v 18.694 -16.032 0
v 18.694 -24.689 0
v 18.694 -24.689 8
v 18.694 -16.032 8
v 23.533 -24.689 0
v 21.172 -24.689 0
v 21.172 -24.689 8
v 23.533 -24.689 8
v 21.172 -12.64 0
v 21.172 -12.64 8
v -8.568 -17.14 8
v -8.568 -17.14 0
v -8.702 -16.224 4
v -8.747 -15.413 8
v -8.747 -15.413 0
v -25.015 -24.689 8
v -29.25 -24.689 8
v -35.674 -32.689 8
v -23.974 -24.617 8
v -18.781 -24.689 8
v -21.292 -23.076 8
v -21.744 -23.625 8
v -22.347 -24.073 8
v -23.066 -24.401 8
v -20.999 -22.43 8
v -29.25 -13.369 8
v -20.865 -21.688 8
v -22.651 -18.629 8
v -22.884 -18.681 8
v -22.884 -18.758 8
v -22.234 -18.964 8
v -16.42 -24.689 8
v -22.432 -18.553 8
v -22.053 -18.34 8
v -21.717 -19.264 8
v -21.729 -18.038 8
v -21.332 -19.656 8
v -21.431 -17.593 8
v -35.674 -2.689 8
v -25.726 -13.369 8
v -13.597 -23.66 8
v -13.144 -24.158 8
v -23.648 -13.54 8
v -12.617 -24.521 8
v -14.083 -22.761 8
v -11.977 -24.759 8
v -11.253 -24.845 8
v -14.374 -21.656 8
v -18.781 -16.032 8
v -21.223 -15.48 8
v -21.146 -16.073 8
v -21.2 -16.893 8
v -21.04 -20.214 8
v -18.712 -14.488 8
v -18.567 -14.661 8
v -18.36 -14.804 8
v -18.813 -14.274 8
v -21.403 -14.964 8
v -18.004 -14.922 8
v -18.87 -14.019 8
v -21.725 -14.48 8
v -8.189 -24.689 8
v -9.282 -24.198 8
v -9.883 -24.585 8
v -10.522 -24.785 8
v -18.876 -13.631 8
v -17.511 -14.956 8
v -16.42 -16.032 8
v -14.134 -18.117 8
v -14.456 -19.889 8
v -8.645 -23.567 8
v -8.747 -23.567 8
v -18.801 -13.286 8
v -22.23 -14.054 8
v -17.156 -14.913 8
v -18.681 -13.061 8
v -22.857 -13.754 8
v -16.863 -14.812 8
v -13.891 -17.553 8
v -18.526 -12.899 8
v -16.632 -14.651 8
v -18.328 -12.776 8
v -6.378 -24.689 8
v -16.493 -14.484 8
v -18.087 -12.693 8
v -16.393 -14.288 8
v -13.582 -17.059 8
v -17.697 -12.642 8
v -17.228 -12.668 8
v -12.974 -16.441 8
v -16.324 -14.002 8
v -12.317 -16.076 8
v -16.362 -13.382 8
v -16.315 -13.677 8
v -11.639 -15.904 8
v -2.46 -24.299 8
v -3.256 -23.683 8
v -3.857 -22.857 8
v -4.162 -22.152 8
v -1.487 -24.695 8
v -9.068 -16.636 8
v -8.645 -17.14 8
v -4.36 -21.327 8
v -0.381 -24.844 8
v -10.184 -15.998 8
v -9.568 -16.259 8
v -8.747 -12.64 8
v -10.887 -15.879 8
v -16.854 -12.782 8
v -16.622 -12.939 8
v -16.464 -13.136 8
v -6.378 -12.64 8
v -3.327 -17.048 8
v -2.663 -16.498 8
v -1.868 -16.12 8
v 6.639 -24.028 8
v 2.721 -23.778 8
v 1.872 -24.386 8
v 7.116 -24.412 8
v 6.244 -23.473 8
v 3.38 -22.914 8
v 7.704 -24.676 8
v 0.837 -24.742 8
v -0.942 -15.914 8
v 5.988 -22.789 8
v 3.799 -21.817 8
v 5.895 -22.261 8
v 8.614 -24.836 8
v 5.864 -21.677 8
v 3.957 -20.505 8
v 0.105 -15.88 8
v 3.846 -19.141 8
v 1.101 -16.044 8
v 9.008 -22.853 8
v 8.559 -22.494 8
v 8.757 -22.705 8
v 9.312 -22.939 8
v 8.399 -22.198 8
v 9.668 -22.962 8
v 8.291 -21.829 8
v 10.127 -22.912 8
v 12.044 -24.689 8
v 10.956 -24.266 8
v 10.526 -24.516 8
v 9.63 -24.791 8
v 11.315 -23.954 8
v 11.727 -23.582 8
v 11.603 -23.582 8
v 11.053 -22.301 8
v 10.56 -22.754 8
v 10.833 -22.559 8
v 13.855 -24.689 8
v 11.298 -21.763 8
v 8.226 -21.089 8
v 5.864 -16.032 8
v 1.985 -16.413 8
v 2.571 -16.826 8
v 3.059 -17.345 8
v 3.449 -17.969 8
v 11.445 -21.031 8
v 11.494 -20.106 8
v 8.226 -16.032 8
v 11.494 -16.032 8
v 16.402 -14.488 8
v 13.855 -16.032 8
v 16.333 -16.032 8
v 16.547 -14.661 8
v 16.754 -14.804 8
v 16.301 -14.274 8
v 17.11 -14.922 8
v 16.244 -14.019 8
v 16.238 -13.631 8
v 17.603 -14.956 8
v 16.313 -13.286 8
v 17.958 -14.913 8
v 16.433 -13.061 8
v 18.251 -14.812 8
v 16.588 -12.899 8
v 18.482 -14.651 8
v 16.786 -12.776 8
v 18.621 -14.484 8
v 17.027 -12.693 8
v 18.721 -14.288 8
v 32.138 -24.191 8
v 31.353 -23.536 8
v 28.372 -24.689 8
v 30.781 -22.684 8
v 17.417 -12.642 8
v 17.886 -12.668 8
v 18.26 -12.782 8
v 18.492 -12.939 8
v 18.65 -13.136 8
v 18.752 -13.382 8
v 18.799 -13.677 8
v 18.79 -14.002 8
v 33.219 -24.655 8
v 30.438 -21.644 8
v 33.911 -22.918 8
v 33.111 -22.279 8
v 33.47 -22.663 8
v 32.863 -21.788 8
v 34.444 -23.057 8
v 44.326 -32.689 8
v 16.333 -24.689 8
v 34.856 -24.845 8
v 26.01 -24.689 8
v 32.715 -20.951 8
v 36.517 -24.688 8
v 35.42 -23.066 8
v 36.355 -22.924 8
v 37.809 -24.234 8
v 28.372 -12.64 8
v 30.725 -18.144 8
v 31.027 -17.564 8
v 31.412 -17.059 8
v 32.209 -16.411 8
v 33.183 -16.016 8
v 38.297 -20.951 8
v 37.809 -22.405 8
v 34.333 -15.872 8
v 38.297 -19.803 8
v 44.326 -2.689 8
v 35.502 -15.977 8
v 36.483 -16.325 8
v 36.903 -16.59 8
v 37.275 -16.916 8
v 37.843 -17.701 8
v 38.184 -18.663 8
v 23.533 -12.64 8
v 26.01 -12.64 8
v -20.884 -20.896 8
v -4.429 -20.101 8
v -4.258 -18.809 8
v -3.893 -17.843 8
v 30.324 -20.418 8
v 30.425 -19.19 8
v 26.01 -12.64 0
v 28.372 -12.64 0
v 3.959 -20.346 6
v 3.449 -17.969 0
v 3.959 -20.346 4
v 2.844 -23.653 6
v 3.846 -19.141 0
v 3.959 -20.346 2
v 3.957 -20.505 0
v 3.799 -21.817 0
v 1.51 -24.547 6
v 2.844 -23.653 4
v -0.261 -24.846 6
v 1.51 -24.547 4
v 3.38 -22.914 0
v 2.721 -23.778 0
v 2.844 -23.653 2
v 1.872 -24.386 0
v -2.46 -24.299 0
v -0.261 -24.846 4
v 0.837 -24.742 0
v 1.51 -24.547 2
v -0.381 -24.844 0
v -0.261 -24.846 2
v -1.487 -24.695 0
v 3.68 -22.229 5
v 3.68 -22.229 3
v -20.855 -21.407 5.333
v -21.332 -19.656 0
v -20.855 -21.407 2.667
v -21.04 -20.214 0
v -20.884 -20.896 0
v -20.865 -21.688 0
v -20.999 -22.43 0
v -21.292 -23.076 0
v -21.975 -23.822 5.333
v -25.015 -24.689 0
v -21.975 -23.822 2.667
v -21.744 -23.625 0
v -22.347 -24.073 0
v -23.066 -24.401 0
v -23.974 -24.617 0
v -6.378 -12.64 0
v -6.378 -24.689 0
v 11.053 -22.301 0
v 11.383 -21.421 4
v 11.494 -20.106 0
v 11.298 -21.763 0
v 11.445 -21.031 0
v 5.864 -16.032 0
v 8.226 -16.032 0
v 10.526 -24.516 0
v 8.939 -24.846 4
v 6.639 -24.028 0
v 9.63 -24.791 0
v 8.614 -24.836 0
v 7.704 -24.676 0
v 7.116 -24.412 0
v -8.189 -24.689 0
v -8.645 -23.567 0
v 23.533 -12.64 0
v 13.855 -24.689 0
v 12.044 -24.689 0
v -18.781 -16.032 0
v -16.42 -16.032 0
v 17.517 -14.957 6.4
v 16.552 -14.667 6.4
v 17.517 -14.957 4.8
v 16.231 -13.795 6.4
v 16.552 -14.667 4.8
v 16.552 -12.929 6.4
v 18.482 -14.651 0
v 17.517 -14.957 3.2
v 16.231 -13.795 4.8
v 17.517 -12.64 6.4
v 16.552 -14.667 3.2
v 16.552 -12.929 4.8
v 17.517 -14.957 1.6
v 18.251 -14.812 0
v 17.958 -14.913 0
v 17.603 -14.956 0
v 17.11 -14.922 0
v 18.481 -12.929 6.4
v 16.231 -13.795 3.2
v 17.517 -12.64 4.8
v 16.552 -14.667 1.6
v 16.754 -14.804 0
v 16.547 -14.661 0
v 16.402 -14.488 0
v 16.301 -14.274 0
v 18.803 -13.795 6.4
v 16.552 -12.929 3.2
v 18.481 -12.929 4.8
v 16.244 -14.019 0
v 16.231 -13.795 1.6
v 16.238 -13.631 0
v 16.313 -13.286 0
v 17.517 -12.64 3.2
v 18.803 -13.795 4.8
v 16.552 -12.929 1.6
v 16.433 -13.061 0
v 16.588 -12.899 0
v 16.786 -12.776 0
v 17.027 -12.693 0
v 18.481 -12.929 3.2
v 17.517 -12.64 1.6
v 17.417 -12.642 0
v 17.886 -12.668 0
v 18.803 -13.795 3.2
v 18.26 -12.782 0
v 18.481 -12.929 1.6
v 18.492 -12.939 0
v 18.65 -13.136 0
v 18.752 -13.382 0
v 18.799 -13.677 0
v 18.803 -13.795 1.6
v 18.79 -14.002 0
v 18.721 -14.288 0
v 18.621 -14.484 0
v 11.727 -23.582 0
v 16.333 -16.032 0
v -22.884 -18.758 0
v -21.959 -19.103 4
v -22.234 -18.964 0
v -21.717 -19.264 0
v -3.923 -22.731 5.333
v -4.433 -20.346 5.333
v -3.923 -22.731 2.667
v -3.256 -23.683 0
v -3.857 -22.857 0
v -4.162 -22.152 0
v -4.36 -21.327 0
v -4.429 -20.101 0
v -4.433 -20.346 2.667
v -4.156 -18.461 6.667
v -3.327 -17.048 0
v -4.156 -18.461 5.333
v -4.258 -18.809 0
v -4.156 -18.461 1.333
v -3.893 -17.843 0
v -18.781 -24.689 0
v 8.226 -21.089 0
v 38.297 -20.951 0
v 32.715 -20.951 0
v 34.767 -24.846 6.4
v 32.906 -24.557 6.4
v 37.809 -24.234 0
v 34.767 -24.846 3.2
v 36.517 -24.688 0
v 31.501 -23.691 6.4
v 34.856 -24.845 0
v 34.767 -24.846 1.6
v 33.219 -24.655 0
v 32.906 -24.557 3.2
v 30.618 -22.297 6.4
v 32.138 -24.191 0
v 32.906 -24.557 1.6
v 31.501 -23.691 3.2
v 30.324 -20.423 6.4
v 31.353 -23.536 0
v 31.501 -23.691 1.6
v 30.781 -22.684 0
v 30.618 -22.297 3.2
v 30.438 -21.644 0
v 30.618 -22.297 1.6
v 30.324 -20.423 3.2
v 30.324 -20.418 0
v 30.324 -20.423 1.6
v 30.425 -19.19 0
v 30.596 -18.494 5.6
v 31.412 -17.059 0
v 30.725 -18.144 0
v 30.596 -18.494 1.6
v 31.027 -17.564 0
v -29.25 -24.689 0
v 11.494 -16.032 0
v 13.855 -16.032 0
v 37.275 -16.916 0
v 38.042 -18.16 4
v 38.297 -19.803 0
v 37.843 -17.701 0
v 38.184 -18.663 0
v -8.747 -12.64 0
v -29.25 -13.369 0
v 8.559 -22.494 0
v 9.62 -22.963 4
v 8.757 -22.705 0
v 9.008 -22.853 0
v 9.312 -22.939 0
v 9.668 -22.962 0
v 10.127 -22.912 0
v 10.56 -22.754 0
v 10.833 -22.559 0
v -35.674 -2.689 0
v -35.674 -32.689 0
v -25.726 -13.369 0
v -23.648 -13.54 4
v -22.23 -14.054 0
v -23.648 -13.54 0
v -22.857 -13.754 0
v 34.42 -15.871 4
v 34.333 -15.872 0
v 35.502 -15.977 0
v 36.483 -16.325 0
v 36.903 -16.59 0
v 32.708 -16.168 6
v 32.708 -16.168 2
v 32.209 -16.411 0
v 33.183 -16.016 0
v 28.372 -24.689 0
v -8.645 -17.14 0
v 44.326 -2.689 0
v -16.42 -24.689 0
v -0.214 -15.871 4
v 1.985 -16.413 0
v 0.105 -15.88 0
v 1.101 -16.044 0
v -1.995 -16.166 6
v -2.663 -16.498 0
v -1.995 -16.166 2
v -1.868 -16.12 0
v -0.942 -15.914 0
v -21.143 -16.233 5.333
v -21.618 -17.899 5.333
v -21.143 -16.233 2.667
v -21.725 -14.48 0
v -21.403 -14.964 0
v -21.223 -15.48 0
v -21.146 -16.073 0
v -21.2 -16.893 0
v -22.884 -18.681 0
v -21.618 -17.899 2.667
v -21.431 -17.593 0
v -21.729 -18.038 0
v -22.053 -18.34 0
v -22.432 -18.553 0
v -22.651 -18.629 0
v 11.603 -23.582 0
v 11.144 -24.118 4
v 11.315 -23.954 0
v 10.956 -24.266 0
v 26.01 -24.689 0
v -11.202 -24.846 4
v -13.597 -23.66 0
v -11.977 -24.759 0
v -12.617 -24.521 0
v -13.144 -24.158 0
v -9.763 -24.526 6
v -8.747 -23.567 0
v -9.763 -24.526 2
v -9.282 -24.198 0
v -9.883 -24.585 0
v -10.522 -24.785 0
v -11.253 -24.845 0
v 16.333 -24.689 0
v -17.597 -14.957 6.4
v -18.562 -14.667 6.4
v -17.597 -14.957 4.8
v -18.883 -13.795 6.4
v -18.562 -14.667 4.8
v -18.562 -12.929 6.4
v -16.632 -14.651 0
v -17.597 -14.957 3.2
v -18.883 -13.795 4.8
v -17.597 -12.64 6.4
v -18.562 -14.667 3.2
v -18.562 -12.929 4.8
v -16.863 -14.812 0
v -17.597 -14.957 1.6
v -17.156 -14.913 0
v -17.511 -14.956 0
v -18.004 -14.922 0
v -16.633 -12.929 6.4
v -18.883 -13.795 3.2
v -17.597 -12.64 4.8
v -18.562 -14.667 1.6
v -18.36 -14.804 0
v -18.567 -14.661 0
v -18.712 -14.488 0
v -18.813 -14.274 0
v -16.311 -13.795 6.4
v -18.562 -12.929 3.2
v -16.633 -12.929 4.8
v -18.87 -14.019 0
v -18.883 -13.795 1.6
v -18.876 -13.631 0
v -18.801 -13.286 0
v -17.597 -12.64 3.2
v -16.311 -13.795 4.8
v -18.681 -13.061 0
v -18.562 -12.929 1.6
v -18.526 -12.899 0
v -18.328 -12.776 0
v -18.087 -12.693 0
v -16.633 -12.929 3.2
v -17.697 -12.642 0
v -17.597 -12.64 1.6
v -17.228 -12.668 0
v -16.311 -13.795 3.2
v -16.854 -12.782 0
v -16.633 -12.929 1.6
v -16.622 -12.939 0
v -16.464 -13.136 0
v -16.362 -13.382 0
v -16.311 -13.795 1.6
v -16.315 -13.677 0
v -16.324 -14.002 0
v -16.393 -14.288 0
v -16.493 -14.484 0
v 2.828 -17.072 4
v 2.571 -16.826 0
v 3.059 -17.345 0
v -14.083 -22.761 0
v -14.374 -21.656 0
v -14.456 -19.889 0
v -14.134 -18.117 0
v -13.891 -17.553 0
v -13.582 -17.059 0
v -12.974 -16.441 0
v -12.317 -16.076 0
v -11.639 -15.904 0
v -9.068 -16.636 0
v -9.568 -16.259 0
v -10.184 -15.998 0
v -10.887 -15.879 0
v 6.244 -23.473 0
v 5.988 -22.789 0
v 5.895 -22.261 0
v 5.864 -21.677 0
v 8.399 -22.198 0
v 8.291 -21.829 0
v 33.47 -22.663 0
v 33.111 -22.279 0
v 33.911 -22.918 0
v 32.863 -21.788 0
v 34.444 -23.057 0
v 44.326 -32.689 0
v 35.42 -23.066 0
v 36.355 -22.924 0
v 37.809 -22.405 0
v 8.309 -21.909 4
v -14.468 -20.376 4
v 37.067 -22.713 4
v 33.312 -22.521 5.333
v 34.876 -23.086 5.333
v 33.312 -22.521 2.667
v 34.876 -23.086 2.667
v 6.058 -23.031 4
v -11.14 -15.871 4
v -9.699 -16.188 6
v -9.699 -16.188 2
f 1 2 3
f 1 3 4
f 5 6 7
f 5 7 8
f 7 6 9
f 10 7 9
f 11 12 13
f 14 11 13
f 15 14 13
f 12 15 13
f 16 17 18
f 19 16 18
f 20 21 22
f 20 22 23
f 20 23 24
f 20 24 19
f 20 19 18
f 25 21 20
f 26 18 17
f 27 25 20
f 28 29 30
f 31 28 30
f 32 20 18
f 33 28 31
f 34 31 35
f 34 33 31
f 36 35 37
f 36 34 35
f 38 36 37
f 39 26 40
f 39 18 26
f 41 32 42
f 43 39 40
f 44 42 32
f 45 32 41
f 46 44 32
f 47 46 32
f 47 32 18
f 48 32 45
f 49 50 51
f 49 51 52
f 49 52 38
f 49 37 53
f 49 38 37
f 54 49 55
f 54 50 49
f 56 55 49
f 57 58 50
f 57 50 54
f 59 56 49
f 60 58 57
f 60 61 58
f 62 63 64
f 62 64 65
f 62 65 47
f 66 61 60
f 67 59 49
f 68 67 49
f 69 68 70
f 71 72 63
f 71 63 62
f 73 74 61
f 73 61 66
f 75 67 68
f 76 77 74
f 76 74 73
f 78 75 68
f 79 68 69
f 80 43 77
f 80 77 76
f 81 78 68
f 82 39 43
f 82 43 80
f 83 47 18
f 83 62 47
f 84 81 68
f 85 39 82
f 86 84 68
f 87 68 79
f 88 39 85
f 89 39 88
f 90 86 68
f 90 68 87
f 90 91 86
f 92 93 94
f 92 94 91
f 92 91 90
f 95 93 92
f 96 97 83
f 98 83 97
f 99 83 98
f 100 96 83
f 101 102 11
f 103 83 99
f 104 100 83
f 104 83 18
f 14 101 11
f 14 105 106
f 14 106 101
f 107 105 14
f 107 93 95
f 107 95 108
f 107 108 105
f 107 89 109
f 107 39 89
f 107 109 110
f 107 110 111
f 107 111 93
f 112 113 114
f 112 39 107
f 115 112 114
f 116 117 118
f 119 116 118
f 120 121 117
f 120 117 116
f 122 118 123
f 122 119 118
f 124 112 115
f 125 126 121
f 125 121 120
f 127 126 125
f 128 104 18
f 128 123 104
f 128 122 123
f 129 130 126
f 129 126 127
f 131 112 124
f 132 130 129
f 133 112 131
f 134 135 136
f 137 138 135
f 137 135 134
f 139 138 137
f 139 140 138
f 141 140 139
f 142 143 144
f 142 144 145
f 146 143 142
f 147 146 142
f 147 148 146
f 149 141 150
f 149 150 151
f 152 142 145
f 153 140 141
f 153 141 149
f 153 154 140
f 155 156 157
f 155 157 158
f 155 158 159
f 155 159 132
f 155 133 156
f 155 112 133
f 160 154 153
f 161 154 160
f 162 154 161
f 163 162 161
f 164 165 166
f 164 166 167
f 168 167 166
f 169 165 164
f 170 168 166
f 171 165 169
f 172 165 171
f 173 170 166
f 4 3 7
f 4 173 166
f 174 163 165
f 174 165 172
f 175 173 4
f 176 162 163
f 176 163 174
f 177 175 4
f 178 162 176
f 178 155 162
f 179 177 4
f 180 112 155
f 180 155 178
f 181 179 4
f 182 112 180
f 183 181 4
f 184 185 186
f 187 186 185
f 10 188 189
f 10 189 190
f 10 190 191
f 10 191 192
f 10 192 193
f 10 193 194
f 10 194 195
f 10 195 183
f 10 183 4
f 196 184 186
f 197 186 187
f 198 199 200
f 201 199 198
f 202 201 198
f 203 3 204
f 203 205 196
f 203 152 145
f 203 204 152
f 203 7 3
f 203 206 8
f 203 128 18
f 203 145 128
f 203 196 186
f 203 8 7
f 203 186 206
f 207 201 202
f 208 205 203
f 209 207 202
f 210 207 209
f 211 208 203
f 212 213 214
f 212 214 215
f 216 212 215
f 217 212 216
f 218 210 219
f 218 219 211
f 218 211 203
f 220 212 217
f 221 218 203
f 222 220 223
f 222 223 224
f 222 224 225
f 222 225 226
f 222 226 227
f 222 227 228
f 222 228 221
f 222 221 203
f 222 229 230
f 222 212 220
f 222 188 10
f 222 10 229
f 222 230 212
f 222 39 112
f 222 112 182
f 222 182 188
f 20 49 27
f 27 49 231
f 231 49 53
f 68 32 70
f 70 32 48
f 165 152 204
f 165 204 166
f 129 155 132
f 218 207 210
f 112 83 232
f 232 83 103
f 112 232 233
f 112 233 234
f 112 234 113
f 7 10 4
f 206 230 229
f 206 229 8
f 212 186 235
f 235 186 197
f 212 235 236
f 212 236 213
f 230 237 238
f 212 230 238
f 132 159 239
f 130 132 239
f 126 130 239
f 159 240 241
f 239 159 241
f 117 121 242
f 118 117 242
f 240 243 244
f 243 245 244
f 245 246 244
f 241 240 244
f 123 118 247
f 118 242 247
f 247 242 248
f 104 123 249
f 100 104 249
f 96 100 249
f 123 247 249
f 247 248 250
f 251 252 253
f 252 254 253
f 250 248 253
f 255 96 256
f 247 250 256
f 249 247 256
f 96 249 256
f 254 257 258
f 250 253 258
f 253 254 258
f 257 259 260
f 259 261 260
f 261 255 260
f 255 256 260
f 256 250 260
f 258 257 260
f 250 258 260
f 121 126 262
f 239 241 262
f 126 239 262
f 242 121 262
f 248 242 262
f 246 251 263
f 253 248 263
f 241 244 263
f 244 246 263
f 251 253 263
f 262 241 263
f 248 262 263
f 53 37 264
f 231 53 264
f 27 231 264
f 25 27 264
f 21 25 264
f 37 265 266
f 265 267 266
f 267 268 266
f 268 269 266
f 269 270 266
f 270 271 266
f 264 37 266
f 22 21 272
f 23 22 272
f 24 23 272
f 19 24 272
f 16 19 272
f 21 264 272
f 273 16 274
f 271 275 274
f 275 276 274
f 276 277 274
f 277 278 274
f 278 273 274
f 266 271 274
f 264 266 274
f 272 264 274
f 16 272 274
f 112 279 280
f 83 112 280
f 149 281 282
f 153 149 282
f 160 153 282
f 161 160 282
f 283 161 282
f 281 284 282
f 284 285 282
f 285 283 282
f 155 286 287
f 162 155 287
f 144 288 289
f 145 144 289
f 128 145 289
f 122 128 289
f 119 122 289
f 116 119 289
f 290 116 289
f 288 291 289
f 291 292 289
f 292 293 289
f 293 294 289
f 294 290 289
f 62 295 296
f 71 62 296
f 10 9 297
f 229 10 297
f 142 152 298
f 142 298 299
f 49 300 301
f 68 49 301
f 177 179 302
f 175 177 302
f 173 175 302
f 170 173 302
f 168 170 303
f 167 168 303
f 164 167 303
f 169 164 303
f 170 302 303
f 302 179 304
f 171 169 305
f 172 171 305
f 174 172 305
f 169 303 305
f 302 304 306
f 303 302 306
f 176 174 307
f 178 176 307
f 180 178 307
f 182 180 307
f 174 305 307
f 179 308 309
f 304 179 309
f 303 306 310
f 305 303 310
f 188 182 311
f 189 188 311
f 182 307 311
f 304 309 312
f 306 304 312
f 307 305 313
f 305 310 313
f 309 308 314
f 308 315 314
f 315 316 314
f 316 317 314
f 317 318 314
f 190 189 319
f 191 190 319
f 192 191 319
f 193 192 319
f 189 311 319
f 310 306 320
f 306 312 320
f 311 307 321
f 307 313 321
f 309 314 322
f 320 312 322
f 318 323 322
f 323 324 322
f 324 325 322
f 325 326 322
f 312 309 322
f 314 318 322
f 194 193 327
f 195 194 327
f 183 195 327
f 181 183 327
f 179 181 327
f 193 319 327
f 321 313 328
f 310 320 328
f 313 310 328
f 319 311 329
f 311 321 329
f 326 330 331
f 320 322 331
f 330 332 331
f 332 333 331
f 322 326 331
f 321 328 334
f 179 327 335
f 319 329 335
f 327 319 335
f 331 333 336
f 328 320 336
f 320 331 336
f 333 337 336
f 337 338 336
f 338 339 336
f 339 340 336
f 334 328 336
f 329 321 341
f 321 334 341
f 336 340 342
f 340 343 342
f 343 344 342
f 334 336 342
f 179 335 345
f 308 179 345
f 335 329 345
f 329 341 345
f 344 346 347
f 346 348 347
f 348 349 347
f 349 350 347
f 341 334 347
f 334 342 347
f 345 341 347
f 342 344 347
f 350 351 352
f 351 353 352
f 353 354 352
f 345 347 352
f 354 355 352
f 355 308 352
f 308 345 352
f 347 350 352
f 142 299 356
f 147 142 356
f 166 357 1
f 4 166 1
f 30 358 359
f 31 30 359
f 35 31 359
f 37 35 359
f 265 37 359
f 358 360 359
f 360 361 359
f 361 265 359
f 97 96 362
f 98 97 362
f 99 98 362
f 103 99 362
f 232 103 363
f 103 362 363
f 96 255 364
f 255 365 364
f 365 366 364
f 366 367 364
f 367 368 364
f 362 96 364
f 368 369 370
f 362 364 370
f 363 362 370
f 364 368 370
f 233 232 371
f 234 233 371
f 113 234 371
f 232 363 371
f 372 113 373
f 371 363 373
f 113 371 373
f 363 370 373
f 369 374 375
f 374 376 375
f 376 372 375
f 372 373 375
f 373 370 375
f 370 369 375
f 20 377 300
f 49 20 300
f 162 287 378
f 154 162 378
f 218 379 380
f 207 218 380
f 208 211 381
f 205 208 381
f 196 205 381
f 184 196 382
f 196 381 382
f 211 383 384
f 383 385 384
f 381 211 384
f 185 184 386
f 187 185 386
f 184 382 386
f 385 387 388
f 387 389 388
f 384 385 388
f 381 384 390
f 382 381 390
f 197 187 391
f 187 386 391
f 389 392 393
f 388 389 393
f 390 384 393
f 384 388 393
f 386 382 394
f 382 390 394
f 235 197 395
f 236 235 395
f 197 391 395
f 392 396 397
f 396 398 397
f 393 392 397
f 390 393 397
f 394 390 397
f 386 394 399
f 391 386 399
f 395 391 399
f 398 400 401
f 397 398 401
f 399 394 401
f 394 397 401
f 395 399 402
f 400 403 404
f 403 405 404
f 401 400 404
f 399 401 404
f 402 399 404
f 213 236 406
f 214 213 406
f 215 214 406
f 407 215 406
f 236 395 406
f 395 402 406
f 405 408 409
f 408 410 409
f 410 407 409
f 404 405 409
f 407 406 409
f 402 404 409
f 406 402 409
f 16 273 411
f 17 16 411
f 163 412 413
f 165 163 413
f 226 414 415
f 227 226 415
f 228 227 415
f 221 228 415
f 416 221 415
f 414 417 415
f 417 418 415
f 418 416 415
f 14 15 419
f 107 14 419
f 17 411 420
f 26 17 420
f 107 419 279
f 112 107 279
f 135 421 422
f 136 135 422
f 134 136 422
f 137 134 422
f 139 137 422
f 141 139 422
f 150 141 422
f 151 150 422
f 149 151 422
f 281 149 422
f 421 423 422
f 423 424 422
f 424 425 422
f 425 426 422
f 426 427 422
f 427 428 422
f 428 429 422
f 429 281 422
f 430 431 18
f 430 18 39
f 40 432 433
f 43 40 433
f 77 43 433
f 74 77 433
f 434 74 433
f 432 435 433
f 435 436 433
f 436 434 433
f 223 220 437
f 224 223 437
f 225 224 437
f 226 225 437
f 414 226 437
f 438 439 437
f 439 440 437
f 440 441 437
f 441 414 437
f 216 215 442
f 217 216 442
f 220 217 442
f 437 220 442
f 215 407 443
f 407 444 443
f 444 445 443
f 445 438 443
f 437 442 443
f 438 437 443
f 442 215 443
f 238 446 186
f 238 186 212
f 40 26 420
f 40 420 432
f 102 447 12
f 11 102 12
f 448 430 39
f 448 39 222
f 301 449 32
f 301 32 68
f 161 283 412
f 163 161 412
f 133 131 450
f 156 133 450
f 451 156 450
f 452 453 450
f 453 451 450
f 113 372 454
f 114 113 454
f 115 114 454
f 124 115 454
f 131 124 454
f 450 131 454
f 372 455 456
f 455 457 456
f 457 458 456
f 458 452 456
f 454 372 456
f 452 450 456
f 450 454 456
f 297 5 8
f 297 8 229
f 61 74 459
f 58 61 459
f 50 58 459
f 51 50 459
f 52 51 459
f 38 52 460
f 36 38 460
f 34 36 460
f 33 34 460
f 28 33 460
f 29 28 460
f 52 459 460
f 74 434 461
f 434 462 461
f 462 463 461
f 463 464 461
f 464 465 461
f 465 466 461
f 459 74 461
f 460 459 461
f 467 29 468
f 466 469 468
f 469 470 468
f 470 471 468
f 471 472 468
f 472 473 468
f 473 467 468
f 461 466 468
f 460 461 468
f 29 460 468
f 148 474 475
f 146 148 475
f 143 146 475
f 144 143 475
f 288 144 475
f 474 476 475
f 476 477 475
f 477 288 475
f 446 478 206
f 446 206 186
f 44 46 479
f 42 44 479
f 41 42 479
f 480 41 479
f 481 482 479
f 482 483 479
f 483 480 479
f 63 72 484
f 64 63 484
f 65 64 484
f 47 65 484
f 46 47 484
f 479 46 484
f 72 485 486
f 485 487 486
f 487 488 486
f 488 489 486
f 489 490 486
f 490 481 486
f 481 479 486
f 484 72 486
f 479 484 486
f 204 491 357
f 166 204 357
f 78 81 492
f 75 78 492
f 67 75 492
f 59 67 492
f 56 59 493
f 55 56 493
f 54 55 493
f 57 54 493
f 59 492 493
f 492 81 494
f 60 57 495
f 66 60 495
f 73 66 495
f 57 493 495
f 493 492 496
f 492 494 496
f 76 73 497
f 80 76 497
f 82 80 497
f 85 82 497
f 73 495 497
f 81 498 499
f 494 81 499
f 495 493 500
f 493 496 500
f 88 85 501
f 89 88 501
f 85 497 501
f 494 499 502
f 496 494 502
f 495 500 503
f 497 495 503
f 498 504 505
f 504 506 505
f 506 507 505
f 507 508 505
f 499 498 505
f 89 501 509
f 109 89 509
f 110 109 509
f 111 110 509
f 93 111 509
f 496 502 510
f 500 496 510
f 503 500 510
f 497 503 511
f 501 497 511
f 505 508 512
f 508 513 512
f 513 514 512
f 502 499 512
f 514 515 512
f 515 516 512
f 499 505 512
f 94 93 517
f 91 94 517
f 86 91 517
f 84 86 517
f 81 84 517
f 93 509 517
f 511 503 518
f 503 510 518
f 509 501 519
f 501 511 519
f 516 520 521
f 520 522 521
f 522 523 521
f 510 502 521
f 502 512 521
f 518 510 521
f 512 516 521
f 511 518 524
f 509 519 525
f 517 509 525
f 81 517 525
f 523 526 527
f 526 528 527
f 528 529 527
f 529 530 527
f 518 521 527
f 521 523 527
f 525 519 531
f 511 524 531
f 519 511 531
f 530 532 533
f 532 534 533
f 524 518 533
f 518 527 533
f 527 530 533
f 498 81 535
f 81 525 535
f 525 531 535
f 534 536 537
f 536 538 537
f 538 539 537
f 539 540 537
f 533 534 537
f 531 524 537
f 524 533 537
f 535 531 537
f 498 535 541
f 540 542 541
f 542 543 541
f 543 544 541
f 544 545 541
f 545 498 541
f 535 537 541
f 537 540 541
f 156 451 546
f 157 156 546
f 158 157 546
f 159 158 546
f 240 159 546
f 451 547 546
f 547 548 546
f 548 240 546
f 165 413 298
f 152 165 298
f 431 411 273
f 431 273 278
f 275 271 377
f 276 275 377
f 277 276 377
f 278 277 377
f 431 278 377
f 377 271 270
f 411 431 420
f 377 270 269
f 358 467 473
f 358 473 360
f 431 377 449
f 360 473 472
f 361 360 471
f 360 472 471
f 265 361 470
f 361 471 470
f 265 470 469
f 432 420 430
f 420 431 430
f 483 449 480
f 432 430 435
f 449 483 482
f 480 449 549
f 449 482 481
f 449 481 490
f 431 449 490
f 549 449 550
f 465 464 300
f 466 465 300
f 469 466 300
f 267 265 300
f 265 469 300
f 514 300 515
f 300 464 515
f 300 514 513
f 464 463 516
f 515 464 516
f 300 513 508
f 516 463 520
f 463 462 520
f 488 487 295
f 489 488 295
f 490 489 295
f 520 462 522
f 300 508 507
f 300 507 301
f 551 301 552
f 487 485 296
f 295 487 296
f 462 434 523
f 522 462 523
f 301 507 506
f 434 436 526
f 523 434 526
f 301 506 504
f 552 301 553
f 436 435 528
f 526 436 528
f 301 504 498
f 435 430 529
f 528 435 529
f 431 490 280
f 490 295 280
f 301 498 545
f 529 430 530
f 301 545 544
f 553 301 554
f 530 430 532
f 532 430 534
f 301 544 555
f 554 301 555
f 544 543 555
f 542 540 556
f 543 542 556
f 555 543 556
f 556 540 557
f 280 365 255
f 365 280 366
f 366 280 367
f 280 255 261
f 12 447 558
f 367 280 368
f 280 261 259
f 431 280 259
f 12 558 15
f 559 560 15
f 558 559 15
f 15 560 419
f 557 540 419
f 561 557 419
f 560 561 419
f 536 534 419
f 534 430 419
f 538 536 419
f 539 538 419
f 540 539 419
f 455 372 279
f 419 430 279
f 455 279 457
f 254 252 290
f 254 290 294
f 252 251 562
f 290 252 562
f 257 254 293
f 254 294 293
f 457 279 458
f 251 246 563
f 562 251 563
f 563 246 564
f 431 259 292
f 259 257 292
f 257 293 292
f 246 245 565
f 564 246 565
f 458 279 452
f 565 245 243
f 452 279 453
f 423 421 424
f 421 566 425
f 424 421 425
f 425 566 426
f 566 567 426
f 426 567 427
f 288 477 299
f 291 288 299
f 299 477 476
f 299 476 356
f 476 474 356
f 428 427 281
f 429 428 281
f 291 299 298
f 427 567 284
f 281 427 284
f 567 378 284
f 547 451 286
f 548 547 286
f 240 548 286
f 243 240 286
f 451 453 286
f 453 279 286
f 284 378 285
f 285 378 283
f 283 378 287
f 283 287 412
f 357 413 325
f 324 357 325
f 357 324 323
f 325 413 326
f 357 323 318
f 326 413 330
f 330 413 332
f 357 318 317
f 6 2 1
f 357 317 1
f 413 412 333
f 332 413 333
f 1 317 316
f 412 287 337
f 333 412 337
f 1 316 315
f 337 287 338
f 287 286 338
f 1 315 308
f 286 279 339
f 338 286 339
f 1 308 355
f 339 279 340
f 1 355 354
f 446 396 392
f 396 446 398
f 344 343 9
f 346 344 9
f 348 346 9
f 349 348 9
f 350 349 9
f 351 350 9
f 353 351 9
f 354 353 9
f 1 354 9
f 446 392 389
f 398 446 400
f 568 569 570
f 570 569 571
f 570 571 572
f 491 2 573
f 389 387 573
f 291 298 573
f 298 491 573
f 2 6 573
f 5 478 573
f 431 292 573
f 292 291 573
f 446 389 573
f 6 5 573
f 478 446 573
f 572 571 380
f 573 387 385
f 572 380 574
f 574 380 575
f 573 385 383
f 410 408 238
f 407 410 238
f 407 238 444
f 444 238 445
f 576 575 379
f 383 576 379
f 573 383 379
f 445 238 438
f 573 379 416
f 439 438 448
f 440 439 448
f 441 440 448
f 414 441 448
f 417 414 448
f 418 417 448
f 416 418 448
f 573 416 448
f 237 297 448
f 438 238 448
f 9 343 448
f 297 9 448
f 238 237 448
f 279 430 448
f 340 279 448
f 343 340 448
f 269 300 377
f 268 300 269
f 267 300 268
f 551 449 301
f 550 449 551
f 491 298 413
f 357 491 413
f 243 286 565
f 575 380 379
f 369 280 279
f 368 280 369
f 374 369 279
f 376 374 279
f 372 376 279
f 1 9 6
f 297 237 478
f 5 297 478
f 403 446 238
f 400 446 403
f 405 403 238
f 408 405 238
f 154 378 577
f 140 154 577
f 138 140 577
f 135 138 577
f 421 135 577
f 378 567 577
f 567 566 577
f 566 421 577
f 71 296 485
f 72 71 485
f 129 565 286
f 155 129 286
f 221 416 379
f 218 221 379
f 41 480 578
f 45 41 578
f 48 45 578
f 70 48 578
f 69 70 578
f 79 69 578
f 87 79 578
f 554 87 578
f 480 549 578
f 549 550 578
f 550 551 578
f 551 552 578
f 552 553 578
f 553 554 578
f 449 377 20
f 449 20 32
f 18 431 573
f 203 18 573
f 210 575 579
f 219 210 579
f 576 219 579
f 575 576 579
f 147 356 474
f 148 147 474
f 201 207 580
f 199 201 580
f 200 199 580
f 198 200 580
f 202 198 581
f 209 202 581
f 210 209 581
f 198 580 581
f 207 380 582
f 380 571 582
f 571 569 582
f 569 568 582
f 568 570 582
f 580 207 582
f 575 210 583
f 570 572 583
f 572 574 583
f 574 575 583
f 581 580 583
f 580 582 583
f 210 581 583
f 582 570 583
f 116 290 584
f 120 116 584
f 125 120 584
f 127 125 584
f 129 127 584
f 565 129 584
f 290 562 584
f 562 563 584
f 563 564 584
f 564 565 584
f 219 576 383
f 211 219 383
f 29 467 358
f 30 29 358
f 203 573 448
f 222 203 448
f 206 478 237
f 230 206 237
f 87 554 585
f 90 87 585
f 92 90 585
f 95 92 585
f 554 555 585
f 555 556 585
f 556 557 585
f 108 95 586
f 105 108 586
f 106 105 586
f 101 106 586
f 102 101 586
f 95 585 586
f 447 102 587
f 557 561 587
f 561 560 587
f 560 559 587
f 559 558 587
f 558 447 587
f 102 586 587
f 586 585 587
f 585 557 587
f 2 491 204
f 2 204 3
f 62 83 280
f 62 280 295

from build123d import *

# Parameters (mm, degrees)
F0_W     = 80
F0_H     = 30
F0_W_2   = 2.3612487611
F0_H_2   = 8.657086224
F0_H_3   = 12.0490584737
F1_DEPTH = 8


with BuildPart() as f1:
    # F0 (on Top) → F1 (new body)
    with BuildSketch(Plane.XY):
        with Locations((4.3256281316, -17.6894681206)):
            Rectangle(F0_W, F0_H)
        with Locations((-17.6007841578, -20.3609250086)):
            Rectangle(F0_W_2, F0_H_2, mode=Mode.SUBTRACT)
        with BuildLine():
            Line((-29.2496939695, -24.6894681206), (-29.2496939695, -13.3688536509))
            Line((-29.2496939695, -13.3688536509), (-25.7264035829, -13.3688536509))
            add(Edge.make_bspline(
                [(-25.7264035829, -13.3688536509), (-23.3180785086, -13.3688536509), (-22.2303679041, -14.0539378927)],
                knots=[0, 0, 0, 1, 1, 1], degree=2))
            add(Edge.make_bspline(
                [(-22.2303679041, -14.0539378927), (-21.1426572995, -14.7390221345), (-21.1426572995, -16.2330756528)],
                knots=[0, 0, 0, 1, 1, 1], degree=2))
            add(Edge.make_bspline(
                [(-21.1426572995, -16.2330756528), (-21.1426572995, -17.2489329373), (-21.6183758327, -17.8993293694)],
                knots=[0, 0, 0, 1, 1, 1], degree=2))
            add(Edge.make_bspline(
                [(-21.6183758327, -17.8993293694), (-22.0940943659, -18.5497258015), (-22.8844808872, -18.6810439383)],
                knots=[0, 0, 0, 1, 1, 1], degree=2))
            Line((-22.8844808872, -18.6810439383), (-22.8844808872, -18.7578526598))
            add(Edge.make_bspline(
                [(-22.8844808872, -18.7578526598), (-21.8091587861, -18.9981896271), (-21.3322014026, -19.6560191613)],
                knots=[0, 0, 0, 1, 1, 1], degree=2))
            add(Edge.make_bspline(
                [(-21.3322014026, -19.6560191613), (-20.855244019, -20.3138486955), (-20.855244019, -21.4065147014)],
                knots=[0, 0, 0, 1, 1, 1], degree=2))
            add(Edge.make_bspline(
                [(-20.855244019, -21.4065147014), (-20.855244019, -22.955077635), (-21.9751647326, -23.8222728778)],
                knots=[0, 0, 0, 1, 1, 1], degree=2))
            add(Edge.make_bspline(
                [(-21.9751647326, -23.8222728778), (-23.0950854462, -24.6894681206), (-25.0153034838, -24.6894681206)],
                knots=[0, 0, 0, 1, 1, 1], degree=2))
            Line((-25.0153034838, -24.6894681206), (-29.2496939695, -24.6894681206))
        make_face(mode=Mode.SUBTRACT)
        with BuildLine():
            add(Edge.make_bspline(
                [(-8.7467207286, -23.5670697064), (-9.5519734541, -24.8455632643), (-11.2021221161, -24.8455632643)],
                knots=[0, 0, 0, 1, 1, 1], degree=2))
            add(Edge.make_bspline(
                [(-11.2021221161, -24.8455632643), (-12.7259080428, -24.8455632643), (-13.5968198367, -23.6599834824)],
                knots=[0, 0, 0, 1, 1, 1], degree=2))
            add(Edge.make_bspline(
                [(-13.5968198367, -23.6599834824), (-14.4677316305, -22.4744037004), (-14.4677316305, -20.3757912128)],
                knots=[0, 0, 0, 1, 1, 1], degree=2))
            add(Edge.make_bspline(
                [(-14.4677316305, -20.3757912128), (-14.4677316305, -18.2474463169), (-13.5819536325, -17.0593888342)],
                knots=[0, 0, 0, 1, 1, 1], degree=2))
            add(Edge.make_bspline(
                [(-13.5819536325, -17.0593888342), (-12.6961756345, -15.8713313516), (-11.1401795988, -15.8713313516)],
                knots=[0, 0, 0, 1, 1, 1], degree=2))
            add(Edge.make_bspline(
                [(-11.1401795988, -15.8713313516), (-9.5048971409, -15.8713313516), (-8.6451350002, -17.1399141068)],
                knots=[0, 0, 0, 1, 1, 1], degree=2))
            Line((-8.6451350002, -17.1399141068), (-8.5683262787, -17.1399141068))
            add(Edge.make_bspline(
                [(-8.5683262787, -17.1399141068), (-8.7467207286, -16.1711331355), (-8.7467207286, -15.4129567232)],
                knots=[0, 0, 0, 1, 1, 1], degree=2))
            Line((-8.7467207286, -15.4129567232), (-8.7467207286, -12.6404096469))
            Line((-8.7467207286, -12.6404096469), (-6.3780388654, -12.6404096469))
            Line((-6.3780388654, -12.6404096469), (-6.3780388654, -24.6894681206))
            Line((-6.3780388654, -24.6894681206), (-8.1892380725, -24.6894681206))
            Line((-8.1892380725, -24.6894681206), (-8.6451350002, -23.5670697064))
            Line((-8.6451350002, -23.5670697064), (-8.7467207286, -23.5670697064))
        make_face(mode=Mode.SUBTRACT)
        with BuildLine():
            add(Edge.make_bspline(
                [(3.448522086, -17.9687049888), (3.958928429, -18.9833234229), (3.958928429, -20.3460588045)],
                knots=[0, 0, 0, 1, 1, 1], degree=2))
            add(Edge.make_bspline(
                [(3.958928429, -20.3460588045), (3.958928429, -22.4595374963), (2.8439631168, -23.6525503803)],
                knots=[0, 0, 0, 1, 1, 1], degree=2))
            add(Edge.make_bspline(
                [(2.8439631168, -23.6525503803), (1.7289978046, -24.8455632643), (-0.2605958525, -24.8455632643)],
                knots=[0, 0, 0, 1, 1, 1], degree=2))
            add(Edge.make_bspline(
                [(-0.2605958525, -24.8455632643), (-1.5068793015, -24.8455632643), (-2.4595552182, -24.2992302614)],
                knots=[0, 0, 0, 1, 1, 1], degree=2))
            add(Edge.make_bspline(
                [(-2.4595552182, -24.2992302614), (-3.412231135, -23.7528972584), (-3.9226374779, -22.7308457222)],
                knots=[0, 0, 0, 1, 1, 1], degree=2))
            add(Edge.make_bspline(
                [(-3.9226374779, -22.7308457222), (-4.4330438208, -21.708794186), (-4.4330438208, -20.3460588045)],
                knots=[0, 0, 0, 1, 1, 1], degree=2))
            add(Edge.make_bspline(
                [(-4.4330438208, -20.3460588045), (-4.4330438208, -18.2251470106), (-3.326750461, -17.0482391811)],
                knots=[0, 0, 0, 1, 1, 1], degree=2))
            add(Edge.make_bspline(
                [(-3.326750461, -17.0482391811), (-2.2204571013, -15.8713313516), (-0.2135195393, -15.8713313516)],
                knots=[0, 0, 0, 1, 1, 1], degree=2))
            add(Edge.make_bspline(
                [(-0.2135195393, -15.8713313516), (1.0327639096, -15.8713313516), (1.9854398264, -16.4127089531)],
                knots=[0, 0, 0, 1, 1, 1], degree=2))
            add(Edge.make_bspline(
                [(1.9854398264, -16.4127089531), (2.9381157431, -16.9540865547), (3.448522086, -17.9687049888)],
                knots=[0, 0, 0, 1, 1, 1], degree=2))
        make_face(mode=Mode.SUBTRACT)
        with BuildLine():
            Line((13.8548649998, -24.6894681206), (12.0436657927, -24.6894681206))
            Line((12.0436657927, -24.6894681206), (11.7265201039, -23.5819359105))
            Line((11.7265201039, -23.5819359105), (11.6026350692, -23.5819359105))
            add(Edge.make_bspline(
                [(11.6026350692, -23.5819359105), (11.223546863, -24.1864948798), (10.5260741178, -24.5160290721)],
                knots=[0, 0, 0, 1, 1, 1], degree=2))
            add(Edge.make_bspline(
                [(10.5260741178, -24.5160290721), (9.8286013725, -24.8455632643), (8.9391068234, -24.8455632643)],
                knots=[0, 0, 0, 1, 1, 1], degree=2))
            add(Edge.make_bspline(
                [(8.9391068234, -24.8455632643), (7.412843196, -24.8455632643), (6.6385617292, -24.0279220354)],
                knots=[0, 0, 0, 1, 1, 1], degree=2))
            add(Edge.make_bspline(
                [(6.6385617292, -24.0279220354), (5.8642802625, -23.2102808065), (5.8642802625, -21.676584077)],
                knots=[0, 0, 0, 1, 1, 1], degree=2))
            Line((5.8642802625, -21.676584077), (5.8642802625, -16.0323818966))
            Line((5.8642802625, -16.0323818966), (8.2255290236, -16.0323818966))
            Line((8.2255290236, -16.0323818966), (8.2255290236, -21.0893690126))
            add(Edge.make_bspline(
                [(8.2255290236, -21.0893690126), (8.2255290236, -22.0259398748), (8.5587797669, -22.494225306)],
                knots=[0, 0, 0, 1, 1, 1], degree=2))
            add(Edge.make_bspline(
                [(8.5587797669, -22.494225306), (8.8920305102, -22.9625107371), (9.6204745142, -22.9625107371)],
                knots=[0, 0, 0, 1, 1, 1], degree=2))
            add(Edge.make_bspline(
                [(9.6204745142, -22.9625107371), (10.6115547917, -22.9625107371), (11.0525855152, -22.3009646519)],
                knots=[0, 0, 0, 1, 1, 1], degree=2))
            add(Edge.make_bspline(
                [(11.0525855152, -22.3009646519), (11.4936162387, -21.6394185666), (11.4936162387, -20.1057218372)],
                knots=[0, 0, 0, 1, 1, 1], degree=2))
            Line((11.4936162387, -20.1057218372), (11.4936162387, -16.0323818966))
            Line((11.4936162387, -16.0323818966), (13.8548649998, -16.0323818966))
            Line((13.8548649998, -16.0323818966), (13.8548649998, -24.6894681206))
        make_face(mode=Mode.SUBTRACT)
        with Locations((17.5131900741, -20.3609250086)):
            Rectangle(F0_W_2, F0_H_2, mode=Mode.SUBTRACT)
        with Locations((22.3521395291, -18.6649388838)):
            Rectangle(F0_W_2, F0_H_3, mode=Mode.SUBTRACT)
        with BuildLine():
            add(Edge.make_bspline(
                [(36.4861831366, -24.694423522), (35.7825161396, -24.8455632643), (34.7666588551, -24.8455632643)],
                knots=[0, 0, 0, 1, 1, 1], degree=2))
            add(Edge.make_bspline(
                [(34.7666588551, -24.8455632643), (32.6779571703, -24.8455632643), (31.5010493407, -23.690954741)],
                knots=[0, 0, 0, 1, 1, 1], degree=2))
            add(Edge.make_bspline(
                [(31.5010493407, -23.690954741), (30.3241415112, -22.5363462178), (30.3241415112, -20.422867526)],
                knots=[0, 0, 0, 1, 1, 1], degree=2))
            add(Edge.make_bspline(
                [(30.3241415112, -20.422867526), (30.3241415112, -18.2474463169), (31.4118521158, -17.0593888342)],
                knots=[0, 0, 0, 1, 1, 1], degree=2))
            add(Edge.make_bspline(
                [(31.4118521158, -17.0593888342), (32.4995627203, -15.8713313516), (34.419780758, -15.8713313516)],
                knots=[0, 0, 0, 1, 1, 1], degree=2))
            add(Edge.make_bspline(
                [(34.419780758, -15.8713313516), (36.2532792714, -15.8713313516), (37.2753308075, -16.915682194)],
                knots=[0, 0, 0, 1, 1, 1], degree=2))
            add(Edge.make_bspline(
                [(37.2753308075, -16.915682194), (38.2973823437, -17.9600330364), (38.2973823437, -19.8034423525)],
                knots=[0, 0, 0, 1, 1, 1], degree=2))
            Line((38.2973823437, -19.8034423525), (38.2973823437, -20.9506177738))
            Line((38.2973823437, -20.9506177738), (32.7151226807, -20.9506177738))
            add(Edge.make_bspline(
                [(32.7151226807, -20.9506177738), (32.7547658918, -21.9565642554), (33.3122485479, -22.5214800136)],
                knots=[0, 0, 0, 1, 1, 1], degree=2))
            add(Edge.make_bspline(
                [(33.3122485479, -22.5214800136), (33.869731204, -23.0863957718), (34.8756776856, -23.0863957718)],
                knots=[0, 0, 0, 1, 1, 1], degree=2))
            add(Edge.make_bspline(
                [(34.8756776856, -23.0863957718), (35.6586311049, -23.0863957718), (36.3548649998, -22.9241063763)],
                knots=[0, 0, 0, 1, 1, 1], degree=2))
            add(Edge.make_bspline(
                [(36.3548649998, -22.9241063763), (37.0510988948, -22.7618169809), (37.809275307, -22.405028081)],
                knots=[0, 0, 0, 1, 1, 1], degree=2))
            Line((37.809275307, -22.405028081), (37.809275307, -24.233571193))
            add(Edge.make_bspline(
                [(37.809275307, -24.233571193), (37.1898501336, -24.5432837797), (36.4861831366, -24.694423522)],
                knots=[0, 0, 0, 1, 1, 1], degree=2))
        make_face(mode=Mode.SUBTRACT)
        with Locations((27.191088984, -18.6649388838)):
            Rectangle(F0_W_2, F0_H_3, mode=Mode.SUBTRACT)
        with BuildLine():
            add(Edge.make_bspline(
                [(-17.5970676067, -14.9570597956), (-18.8829942668, -14.9570597956), (-18.8829942668, -13.7950181702)],
                knots=[0, 0, 0, 1, 1, 1], degree=2))
            add(Edge.make_bspline(
                [(-18.8829942668, -13.7950181702), (-18.8829942668, -12.6404096469), (-17.5970676067, -12.6404096469)],
                knots=[0, 0, 0, 1, 1, 1], degree=2))
            add(Edge.make_bspline(
                [(-17.5970676067, -12.6404096469), (-16.3111409467, -12.6404096469), (-16.3111409467, -13.7950181702)],
                knots=[0, 0, 0, 1, 1, 1], degree=2))
            add(Edge.make_bspline(
                [(-16.3111409467, -13.7950181702), (-16.3111409467, -14.3450677242), (-16.6320031865, -14.6510637599)],
                knots=[0, 0, 0, 1, 1, 1], degree=2))
            add(Edge.make_bspline(
                [(-16.6320031865, -14.6510637599), (-16.9528654264, -14.9570597956), (-17.5970676067, -14.9570597956)],
                knots=[0, 0, 0, 1, 1, 1], degree=2))
        make_face(mode=Mode.SUBTRACT)
        with BuildLine():
            add(Edge.make_bspline(
                [(17.5169066252, -14.9570597956), (16.2309799651, -14.9570597956), (16.2309799651, -13.7950181702)],
                knots=[0, 0, 0, 1, 1, 1], degree=2))
            add(Edge.make_bspline(
                [(16.2309799651, -13.7950181702), (16.2309799651, -12.6404096469), (17.5169066252, -12.6404096469)],
                knots=[0, 0, 0, 1, 1, 1], degree=2))
            add(Edge.make_bspline(
                [(17.5169066252, -12.6404096469), (18.8028332852, -12.6404096469), (18.8028332852, -13.7950181702)],
                knots=[0, 0, 0, 1, 1, 1], degree=2))
            add(Edge.make_bspline(
                [(18.8028332852, -13.7950181702), (18.8028332852, -14.3450677242), (18.4819710454, -14.6510637599)],
                knots=[0, 0, 0, 1, 1, 1], degree=2))
            add(Edge.make_bspline(
                [(18.4819710454, -14.6510637599), (18.1611088056, -14.9570597956), (17.5169066252, -14.9570597956)],
                knots=[0, 0, 0, 1, 1, 1], degree=2))
        make_face(mode=Mode.SUBTRACT)
    extrude(amount=F1_DEPTH)


solid = f1.part
